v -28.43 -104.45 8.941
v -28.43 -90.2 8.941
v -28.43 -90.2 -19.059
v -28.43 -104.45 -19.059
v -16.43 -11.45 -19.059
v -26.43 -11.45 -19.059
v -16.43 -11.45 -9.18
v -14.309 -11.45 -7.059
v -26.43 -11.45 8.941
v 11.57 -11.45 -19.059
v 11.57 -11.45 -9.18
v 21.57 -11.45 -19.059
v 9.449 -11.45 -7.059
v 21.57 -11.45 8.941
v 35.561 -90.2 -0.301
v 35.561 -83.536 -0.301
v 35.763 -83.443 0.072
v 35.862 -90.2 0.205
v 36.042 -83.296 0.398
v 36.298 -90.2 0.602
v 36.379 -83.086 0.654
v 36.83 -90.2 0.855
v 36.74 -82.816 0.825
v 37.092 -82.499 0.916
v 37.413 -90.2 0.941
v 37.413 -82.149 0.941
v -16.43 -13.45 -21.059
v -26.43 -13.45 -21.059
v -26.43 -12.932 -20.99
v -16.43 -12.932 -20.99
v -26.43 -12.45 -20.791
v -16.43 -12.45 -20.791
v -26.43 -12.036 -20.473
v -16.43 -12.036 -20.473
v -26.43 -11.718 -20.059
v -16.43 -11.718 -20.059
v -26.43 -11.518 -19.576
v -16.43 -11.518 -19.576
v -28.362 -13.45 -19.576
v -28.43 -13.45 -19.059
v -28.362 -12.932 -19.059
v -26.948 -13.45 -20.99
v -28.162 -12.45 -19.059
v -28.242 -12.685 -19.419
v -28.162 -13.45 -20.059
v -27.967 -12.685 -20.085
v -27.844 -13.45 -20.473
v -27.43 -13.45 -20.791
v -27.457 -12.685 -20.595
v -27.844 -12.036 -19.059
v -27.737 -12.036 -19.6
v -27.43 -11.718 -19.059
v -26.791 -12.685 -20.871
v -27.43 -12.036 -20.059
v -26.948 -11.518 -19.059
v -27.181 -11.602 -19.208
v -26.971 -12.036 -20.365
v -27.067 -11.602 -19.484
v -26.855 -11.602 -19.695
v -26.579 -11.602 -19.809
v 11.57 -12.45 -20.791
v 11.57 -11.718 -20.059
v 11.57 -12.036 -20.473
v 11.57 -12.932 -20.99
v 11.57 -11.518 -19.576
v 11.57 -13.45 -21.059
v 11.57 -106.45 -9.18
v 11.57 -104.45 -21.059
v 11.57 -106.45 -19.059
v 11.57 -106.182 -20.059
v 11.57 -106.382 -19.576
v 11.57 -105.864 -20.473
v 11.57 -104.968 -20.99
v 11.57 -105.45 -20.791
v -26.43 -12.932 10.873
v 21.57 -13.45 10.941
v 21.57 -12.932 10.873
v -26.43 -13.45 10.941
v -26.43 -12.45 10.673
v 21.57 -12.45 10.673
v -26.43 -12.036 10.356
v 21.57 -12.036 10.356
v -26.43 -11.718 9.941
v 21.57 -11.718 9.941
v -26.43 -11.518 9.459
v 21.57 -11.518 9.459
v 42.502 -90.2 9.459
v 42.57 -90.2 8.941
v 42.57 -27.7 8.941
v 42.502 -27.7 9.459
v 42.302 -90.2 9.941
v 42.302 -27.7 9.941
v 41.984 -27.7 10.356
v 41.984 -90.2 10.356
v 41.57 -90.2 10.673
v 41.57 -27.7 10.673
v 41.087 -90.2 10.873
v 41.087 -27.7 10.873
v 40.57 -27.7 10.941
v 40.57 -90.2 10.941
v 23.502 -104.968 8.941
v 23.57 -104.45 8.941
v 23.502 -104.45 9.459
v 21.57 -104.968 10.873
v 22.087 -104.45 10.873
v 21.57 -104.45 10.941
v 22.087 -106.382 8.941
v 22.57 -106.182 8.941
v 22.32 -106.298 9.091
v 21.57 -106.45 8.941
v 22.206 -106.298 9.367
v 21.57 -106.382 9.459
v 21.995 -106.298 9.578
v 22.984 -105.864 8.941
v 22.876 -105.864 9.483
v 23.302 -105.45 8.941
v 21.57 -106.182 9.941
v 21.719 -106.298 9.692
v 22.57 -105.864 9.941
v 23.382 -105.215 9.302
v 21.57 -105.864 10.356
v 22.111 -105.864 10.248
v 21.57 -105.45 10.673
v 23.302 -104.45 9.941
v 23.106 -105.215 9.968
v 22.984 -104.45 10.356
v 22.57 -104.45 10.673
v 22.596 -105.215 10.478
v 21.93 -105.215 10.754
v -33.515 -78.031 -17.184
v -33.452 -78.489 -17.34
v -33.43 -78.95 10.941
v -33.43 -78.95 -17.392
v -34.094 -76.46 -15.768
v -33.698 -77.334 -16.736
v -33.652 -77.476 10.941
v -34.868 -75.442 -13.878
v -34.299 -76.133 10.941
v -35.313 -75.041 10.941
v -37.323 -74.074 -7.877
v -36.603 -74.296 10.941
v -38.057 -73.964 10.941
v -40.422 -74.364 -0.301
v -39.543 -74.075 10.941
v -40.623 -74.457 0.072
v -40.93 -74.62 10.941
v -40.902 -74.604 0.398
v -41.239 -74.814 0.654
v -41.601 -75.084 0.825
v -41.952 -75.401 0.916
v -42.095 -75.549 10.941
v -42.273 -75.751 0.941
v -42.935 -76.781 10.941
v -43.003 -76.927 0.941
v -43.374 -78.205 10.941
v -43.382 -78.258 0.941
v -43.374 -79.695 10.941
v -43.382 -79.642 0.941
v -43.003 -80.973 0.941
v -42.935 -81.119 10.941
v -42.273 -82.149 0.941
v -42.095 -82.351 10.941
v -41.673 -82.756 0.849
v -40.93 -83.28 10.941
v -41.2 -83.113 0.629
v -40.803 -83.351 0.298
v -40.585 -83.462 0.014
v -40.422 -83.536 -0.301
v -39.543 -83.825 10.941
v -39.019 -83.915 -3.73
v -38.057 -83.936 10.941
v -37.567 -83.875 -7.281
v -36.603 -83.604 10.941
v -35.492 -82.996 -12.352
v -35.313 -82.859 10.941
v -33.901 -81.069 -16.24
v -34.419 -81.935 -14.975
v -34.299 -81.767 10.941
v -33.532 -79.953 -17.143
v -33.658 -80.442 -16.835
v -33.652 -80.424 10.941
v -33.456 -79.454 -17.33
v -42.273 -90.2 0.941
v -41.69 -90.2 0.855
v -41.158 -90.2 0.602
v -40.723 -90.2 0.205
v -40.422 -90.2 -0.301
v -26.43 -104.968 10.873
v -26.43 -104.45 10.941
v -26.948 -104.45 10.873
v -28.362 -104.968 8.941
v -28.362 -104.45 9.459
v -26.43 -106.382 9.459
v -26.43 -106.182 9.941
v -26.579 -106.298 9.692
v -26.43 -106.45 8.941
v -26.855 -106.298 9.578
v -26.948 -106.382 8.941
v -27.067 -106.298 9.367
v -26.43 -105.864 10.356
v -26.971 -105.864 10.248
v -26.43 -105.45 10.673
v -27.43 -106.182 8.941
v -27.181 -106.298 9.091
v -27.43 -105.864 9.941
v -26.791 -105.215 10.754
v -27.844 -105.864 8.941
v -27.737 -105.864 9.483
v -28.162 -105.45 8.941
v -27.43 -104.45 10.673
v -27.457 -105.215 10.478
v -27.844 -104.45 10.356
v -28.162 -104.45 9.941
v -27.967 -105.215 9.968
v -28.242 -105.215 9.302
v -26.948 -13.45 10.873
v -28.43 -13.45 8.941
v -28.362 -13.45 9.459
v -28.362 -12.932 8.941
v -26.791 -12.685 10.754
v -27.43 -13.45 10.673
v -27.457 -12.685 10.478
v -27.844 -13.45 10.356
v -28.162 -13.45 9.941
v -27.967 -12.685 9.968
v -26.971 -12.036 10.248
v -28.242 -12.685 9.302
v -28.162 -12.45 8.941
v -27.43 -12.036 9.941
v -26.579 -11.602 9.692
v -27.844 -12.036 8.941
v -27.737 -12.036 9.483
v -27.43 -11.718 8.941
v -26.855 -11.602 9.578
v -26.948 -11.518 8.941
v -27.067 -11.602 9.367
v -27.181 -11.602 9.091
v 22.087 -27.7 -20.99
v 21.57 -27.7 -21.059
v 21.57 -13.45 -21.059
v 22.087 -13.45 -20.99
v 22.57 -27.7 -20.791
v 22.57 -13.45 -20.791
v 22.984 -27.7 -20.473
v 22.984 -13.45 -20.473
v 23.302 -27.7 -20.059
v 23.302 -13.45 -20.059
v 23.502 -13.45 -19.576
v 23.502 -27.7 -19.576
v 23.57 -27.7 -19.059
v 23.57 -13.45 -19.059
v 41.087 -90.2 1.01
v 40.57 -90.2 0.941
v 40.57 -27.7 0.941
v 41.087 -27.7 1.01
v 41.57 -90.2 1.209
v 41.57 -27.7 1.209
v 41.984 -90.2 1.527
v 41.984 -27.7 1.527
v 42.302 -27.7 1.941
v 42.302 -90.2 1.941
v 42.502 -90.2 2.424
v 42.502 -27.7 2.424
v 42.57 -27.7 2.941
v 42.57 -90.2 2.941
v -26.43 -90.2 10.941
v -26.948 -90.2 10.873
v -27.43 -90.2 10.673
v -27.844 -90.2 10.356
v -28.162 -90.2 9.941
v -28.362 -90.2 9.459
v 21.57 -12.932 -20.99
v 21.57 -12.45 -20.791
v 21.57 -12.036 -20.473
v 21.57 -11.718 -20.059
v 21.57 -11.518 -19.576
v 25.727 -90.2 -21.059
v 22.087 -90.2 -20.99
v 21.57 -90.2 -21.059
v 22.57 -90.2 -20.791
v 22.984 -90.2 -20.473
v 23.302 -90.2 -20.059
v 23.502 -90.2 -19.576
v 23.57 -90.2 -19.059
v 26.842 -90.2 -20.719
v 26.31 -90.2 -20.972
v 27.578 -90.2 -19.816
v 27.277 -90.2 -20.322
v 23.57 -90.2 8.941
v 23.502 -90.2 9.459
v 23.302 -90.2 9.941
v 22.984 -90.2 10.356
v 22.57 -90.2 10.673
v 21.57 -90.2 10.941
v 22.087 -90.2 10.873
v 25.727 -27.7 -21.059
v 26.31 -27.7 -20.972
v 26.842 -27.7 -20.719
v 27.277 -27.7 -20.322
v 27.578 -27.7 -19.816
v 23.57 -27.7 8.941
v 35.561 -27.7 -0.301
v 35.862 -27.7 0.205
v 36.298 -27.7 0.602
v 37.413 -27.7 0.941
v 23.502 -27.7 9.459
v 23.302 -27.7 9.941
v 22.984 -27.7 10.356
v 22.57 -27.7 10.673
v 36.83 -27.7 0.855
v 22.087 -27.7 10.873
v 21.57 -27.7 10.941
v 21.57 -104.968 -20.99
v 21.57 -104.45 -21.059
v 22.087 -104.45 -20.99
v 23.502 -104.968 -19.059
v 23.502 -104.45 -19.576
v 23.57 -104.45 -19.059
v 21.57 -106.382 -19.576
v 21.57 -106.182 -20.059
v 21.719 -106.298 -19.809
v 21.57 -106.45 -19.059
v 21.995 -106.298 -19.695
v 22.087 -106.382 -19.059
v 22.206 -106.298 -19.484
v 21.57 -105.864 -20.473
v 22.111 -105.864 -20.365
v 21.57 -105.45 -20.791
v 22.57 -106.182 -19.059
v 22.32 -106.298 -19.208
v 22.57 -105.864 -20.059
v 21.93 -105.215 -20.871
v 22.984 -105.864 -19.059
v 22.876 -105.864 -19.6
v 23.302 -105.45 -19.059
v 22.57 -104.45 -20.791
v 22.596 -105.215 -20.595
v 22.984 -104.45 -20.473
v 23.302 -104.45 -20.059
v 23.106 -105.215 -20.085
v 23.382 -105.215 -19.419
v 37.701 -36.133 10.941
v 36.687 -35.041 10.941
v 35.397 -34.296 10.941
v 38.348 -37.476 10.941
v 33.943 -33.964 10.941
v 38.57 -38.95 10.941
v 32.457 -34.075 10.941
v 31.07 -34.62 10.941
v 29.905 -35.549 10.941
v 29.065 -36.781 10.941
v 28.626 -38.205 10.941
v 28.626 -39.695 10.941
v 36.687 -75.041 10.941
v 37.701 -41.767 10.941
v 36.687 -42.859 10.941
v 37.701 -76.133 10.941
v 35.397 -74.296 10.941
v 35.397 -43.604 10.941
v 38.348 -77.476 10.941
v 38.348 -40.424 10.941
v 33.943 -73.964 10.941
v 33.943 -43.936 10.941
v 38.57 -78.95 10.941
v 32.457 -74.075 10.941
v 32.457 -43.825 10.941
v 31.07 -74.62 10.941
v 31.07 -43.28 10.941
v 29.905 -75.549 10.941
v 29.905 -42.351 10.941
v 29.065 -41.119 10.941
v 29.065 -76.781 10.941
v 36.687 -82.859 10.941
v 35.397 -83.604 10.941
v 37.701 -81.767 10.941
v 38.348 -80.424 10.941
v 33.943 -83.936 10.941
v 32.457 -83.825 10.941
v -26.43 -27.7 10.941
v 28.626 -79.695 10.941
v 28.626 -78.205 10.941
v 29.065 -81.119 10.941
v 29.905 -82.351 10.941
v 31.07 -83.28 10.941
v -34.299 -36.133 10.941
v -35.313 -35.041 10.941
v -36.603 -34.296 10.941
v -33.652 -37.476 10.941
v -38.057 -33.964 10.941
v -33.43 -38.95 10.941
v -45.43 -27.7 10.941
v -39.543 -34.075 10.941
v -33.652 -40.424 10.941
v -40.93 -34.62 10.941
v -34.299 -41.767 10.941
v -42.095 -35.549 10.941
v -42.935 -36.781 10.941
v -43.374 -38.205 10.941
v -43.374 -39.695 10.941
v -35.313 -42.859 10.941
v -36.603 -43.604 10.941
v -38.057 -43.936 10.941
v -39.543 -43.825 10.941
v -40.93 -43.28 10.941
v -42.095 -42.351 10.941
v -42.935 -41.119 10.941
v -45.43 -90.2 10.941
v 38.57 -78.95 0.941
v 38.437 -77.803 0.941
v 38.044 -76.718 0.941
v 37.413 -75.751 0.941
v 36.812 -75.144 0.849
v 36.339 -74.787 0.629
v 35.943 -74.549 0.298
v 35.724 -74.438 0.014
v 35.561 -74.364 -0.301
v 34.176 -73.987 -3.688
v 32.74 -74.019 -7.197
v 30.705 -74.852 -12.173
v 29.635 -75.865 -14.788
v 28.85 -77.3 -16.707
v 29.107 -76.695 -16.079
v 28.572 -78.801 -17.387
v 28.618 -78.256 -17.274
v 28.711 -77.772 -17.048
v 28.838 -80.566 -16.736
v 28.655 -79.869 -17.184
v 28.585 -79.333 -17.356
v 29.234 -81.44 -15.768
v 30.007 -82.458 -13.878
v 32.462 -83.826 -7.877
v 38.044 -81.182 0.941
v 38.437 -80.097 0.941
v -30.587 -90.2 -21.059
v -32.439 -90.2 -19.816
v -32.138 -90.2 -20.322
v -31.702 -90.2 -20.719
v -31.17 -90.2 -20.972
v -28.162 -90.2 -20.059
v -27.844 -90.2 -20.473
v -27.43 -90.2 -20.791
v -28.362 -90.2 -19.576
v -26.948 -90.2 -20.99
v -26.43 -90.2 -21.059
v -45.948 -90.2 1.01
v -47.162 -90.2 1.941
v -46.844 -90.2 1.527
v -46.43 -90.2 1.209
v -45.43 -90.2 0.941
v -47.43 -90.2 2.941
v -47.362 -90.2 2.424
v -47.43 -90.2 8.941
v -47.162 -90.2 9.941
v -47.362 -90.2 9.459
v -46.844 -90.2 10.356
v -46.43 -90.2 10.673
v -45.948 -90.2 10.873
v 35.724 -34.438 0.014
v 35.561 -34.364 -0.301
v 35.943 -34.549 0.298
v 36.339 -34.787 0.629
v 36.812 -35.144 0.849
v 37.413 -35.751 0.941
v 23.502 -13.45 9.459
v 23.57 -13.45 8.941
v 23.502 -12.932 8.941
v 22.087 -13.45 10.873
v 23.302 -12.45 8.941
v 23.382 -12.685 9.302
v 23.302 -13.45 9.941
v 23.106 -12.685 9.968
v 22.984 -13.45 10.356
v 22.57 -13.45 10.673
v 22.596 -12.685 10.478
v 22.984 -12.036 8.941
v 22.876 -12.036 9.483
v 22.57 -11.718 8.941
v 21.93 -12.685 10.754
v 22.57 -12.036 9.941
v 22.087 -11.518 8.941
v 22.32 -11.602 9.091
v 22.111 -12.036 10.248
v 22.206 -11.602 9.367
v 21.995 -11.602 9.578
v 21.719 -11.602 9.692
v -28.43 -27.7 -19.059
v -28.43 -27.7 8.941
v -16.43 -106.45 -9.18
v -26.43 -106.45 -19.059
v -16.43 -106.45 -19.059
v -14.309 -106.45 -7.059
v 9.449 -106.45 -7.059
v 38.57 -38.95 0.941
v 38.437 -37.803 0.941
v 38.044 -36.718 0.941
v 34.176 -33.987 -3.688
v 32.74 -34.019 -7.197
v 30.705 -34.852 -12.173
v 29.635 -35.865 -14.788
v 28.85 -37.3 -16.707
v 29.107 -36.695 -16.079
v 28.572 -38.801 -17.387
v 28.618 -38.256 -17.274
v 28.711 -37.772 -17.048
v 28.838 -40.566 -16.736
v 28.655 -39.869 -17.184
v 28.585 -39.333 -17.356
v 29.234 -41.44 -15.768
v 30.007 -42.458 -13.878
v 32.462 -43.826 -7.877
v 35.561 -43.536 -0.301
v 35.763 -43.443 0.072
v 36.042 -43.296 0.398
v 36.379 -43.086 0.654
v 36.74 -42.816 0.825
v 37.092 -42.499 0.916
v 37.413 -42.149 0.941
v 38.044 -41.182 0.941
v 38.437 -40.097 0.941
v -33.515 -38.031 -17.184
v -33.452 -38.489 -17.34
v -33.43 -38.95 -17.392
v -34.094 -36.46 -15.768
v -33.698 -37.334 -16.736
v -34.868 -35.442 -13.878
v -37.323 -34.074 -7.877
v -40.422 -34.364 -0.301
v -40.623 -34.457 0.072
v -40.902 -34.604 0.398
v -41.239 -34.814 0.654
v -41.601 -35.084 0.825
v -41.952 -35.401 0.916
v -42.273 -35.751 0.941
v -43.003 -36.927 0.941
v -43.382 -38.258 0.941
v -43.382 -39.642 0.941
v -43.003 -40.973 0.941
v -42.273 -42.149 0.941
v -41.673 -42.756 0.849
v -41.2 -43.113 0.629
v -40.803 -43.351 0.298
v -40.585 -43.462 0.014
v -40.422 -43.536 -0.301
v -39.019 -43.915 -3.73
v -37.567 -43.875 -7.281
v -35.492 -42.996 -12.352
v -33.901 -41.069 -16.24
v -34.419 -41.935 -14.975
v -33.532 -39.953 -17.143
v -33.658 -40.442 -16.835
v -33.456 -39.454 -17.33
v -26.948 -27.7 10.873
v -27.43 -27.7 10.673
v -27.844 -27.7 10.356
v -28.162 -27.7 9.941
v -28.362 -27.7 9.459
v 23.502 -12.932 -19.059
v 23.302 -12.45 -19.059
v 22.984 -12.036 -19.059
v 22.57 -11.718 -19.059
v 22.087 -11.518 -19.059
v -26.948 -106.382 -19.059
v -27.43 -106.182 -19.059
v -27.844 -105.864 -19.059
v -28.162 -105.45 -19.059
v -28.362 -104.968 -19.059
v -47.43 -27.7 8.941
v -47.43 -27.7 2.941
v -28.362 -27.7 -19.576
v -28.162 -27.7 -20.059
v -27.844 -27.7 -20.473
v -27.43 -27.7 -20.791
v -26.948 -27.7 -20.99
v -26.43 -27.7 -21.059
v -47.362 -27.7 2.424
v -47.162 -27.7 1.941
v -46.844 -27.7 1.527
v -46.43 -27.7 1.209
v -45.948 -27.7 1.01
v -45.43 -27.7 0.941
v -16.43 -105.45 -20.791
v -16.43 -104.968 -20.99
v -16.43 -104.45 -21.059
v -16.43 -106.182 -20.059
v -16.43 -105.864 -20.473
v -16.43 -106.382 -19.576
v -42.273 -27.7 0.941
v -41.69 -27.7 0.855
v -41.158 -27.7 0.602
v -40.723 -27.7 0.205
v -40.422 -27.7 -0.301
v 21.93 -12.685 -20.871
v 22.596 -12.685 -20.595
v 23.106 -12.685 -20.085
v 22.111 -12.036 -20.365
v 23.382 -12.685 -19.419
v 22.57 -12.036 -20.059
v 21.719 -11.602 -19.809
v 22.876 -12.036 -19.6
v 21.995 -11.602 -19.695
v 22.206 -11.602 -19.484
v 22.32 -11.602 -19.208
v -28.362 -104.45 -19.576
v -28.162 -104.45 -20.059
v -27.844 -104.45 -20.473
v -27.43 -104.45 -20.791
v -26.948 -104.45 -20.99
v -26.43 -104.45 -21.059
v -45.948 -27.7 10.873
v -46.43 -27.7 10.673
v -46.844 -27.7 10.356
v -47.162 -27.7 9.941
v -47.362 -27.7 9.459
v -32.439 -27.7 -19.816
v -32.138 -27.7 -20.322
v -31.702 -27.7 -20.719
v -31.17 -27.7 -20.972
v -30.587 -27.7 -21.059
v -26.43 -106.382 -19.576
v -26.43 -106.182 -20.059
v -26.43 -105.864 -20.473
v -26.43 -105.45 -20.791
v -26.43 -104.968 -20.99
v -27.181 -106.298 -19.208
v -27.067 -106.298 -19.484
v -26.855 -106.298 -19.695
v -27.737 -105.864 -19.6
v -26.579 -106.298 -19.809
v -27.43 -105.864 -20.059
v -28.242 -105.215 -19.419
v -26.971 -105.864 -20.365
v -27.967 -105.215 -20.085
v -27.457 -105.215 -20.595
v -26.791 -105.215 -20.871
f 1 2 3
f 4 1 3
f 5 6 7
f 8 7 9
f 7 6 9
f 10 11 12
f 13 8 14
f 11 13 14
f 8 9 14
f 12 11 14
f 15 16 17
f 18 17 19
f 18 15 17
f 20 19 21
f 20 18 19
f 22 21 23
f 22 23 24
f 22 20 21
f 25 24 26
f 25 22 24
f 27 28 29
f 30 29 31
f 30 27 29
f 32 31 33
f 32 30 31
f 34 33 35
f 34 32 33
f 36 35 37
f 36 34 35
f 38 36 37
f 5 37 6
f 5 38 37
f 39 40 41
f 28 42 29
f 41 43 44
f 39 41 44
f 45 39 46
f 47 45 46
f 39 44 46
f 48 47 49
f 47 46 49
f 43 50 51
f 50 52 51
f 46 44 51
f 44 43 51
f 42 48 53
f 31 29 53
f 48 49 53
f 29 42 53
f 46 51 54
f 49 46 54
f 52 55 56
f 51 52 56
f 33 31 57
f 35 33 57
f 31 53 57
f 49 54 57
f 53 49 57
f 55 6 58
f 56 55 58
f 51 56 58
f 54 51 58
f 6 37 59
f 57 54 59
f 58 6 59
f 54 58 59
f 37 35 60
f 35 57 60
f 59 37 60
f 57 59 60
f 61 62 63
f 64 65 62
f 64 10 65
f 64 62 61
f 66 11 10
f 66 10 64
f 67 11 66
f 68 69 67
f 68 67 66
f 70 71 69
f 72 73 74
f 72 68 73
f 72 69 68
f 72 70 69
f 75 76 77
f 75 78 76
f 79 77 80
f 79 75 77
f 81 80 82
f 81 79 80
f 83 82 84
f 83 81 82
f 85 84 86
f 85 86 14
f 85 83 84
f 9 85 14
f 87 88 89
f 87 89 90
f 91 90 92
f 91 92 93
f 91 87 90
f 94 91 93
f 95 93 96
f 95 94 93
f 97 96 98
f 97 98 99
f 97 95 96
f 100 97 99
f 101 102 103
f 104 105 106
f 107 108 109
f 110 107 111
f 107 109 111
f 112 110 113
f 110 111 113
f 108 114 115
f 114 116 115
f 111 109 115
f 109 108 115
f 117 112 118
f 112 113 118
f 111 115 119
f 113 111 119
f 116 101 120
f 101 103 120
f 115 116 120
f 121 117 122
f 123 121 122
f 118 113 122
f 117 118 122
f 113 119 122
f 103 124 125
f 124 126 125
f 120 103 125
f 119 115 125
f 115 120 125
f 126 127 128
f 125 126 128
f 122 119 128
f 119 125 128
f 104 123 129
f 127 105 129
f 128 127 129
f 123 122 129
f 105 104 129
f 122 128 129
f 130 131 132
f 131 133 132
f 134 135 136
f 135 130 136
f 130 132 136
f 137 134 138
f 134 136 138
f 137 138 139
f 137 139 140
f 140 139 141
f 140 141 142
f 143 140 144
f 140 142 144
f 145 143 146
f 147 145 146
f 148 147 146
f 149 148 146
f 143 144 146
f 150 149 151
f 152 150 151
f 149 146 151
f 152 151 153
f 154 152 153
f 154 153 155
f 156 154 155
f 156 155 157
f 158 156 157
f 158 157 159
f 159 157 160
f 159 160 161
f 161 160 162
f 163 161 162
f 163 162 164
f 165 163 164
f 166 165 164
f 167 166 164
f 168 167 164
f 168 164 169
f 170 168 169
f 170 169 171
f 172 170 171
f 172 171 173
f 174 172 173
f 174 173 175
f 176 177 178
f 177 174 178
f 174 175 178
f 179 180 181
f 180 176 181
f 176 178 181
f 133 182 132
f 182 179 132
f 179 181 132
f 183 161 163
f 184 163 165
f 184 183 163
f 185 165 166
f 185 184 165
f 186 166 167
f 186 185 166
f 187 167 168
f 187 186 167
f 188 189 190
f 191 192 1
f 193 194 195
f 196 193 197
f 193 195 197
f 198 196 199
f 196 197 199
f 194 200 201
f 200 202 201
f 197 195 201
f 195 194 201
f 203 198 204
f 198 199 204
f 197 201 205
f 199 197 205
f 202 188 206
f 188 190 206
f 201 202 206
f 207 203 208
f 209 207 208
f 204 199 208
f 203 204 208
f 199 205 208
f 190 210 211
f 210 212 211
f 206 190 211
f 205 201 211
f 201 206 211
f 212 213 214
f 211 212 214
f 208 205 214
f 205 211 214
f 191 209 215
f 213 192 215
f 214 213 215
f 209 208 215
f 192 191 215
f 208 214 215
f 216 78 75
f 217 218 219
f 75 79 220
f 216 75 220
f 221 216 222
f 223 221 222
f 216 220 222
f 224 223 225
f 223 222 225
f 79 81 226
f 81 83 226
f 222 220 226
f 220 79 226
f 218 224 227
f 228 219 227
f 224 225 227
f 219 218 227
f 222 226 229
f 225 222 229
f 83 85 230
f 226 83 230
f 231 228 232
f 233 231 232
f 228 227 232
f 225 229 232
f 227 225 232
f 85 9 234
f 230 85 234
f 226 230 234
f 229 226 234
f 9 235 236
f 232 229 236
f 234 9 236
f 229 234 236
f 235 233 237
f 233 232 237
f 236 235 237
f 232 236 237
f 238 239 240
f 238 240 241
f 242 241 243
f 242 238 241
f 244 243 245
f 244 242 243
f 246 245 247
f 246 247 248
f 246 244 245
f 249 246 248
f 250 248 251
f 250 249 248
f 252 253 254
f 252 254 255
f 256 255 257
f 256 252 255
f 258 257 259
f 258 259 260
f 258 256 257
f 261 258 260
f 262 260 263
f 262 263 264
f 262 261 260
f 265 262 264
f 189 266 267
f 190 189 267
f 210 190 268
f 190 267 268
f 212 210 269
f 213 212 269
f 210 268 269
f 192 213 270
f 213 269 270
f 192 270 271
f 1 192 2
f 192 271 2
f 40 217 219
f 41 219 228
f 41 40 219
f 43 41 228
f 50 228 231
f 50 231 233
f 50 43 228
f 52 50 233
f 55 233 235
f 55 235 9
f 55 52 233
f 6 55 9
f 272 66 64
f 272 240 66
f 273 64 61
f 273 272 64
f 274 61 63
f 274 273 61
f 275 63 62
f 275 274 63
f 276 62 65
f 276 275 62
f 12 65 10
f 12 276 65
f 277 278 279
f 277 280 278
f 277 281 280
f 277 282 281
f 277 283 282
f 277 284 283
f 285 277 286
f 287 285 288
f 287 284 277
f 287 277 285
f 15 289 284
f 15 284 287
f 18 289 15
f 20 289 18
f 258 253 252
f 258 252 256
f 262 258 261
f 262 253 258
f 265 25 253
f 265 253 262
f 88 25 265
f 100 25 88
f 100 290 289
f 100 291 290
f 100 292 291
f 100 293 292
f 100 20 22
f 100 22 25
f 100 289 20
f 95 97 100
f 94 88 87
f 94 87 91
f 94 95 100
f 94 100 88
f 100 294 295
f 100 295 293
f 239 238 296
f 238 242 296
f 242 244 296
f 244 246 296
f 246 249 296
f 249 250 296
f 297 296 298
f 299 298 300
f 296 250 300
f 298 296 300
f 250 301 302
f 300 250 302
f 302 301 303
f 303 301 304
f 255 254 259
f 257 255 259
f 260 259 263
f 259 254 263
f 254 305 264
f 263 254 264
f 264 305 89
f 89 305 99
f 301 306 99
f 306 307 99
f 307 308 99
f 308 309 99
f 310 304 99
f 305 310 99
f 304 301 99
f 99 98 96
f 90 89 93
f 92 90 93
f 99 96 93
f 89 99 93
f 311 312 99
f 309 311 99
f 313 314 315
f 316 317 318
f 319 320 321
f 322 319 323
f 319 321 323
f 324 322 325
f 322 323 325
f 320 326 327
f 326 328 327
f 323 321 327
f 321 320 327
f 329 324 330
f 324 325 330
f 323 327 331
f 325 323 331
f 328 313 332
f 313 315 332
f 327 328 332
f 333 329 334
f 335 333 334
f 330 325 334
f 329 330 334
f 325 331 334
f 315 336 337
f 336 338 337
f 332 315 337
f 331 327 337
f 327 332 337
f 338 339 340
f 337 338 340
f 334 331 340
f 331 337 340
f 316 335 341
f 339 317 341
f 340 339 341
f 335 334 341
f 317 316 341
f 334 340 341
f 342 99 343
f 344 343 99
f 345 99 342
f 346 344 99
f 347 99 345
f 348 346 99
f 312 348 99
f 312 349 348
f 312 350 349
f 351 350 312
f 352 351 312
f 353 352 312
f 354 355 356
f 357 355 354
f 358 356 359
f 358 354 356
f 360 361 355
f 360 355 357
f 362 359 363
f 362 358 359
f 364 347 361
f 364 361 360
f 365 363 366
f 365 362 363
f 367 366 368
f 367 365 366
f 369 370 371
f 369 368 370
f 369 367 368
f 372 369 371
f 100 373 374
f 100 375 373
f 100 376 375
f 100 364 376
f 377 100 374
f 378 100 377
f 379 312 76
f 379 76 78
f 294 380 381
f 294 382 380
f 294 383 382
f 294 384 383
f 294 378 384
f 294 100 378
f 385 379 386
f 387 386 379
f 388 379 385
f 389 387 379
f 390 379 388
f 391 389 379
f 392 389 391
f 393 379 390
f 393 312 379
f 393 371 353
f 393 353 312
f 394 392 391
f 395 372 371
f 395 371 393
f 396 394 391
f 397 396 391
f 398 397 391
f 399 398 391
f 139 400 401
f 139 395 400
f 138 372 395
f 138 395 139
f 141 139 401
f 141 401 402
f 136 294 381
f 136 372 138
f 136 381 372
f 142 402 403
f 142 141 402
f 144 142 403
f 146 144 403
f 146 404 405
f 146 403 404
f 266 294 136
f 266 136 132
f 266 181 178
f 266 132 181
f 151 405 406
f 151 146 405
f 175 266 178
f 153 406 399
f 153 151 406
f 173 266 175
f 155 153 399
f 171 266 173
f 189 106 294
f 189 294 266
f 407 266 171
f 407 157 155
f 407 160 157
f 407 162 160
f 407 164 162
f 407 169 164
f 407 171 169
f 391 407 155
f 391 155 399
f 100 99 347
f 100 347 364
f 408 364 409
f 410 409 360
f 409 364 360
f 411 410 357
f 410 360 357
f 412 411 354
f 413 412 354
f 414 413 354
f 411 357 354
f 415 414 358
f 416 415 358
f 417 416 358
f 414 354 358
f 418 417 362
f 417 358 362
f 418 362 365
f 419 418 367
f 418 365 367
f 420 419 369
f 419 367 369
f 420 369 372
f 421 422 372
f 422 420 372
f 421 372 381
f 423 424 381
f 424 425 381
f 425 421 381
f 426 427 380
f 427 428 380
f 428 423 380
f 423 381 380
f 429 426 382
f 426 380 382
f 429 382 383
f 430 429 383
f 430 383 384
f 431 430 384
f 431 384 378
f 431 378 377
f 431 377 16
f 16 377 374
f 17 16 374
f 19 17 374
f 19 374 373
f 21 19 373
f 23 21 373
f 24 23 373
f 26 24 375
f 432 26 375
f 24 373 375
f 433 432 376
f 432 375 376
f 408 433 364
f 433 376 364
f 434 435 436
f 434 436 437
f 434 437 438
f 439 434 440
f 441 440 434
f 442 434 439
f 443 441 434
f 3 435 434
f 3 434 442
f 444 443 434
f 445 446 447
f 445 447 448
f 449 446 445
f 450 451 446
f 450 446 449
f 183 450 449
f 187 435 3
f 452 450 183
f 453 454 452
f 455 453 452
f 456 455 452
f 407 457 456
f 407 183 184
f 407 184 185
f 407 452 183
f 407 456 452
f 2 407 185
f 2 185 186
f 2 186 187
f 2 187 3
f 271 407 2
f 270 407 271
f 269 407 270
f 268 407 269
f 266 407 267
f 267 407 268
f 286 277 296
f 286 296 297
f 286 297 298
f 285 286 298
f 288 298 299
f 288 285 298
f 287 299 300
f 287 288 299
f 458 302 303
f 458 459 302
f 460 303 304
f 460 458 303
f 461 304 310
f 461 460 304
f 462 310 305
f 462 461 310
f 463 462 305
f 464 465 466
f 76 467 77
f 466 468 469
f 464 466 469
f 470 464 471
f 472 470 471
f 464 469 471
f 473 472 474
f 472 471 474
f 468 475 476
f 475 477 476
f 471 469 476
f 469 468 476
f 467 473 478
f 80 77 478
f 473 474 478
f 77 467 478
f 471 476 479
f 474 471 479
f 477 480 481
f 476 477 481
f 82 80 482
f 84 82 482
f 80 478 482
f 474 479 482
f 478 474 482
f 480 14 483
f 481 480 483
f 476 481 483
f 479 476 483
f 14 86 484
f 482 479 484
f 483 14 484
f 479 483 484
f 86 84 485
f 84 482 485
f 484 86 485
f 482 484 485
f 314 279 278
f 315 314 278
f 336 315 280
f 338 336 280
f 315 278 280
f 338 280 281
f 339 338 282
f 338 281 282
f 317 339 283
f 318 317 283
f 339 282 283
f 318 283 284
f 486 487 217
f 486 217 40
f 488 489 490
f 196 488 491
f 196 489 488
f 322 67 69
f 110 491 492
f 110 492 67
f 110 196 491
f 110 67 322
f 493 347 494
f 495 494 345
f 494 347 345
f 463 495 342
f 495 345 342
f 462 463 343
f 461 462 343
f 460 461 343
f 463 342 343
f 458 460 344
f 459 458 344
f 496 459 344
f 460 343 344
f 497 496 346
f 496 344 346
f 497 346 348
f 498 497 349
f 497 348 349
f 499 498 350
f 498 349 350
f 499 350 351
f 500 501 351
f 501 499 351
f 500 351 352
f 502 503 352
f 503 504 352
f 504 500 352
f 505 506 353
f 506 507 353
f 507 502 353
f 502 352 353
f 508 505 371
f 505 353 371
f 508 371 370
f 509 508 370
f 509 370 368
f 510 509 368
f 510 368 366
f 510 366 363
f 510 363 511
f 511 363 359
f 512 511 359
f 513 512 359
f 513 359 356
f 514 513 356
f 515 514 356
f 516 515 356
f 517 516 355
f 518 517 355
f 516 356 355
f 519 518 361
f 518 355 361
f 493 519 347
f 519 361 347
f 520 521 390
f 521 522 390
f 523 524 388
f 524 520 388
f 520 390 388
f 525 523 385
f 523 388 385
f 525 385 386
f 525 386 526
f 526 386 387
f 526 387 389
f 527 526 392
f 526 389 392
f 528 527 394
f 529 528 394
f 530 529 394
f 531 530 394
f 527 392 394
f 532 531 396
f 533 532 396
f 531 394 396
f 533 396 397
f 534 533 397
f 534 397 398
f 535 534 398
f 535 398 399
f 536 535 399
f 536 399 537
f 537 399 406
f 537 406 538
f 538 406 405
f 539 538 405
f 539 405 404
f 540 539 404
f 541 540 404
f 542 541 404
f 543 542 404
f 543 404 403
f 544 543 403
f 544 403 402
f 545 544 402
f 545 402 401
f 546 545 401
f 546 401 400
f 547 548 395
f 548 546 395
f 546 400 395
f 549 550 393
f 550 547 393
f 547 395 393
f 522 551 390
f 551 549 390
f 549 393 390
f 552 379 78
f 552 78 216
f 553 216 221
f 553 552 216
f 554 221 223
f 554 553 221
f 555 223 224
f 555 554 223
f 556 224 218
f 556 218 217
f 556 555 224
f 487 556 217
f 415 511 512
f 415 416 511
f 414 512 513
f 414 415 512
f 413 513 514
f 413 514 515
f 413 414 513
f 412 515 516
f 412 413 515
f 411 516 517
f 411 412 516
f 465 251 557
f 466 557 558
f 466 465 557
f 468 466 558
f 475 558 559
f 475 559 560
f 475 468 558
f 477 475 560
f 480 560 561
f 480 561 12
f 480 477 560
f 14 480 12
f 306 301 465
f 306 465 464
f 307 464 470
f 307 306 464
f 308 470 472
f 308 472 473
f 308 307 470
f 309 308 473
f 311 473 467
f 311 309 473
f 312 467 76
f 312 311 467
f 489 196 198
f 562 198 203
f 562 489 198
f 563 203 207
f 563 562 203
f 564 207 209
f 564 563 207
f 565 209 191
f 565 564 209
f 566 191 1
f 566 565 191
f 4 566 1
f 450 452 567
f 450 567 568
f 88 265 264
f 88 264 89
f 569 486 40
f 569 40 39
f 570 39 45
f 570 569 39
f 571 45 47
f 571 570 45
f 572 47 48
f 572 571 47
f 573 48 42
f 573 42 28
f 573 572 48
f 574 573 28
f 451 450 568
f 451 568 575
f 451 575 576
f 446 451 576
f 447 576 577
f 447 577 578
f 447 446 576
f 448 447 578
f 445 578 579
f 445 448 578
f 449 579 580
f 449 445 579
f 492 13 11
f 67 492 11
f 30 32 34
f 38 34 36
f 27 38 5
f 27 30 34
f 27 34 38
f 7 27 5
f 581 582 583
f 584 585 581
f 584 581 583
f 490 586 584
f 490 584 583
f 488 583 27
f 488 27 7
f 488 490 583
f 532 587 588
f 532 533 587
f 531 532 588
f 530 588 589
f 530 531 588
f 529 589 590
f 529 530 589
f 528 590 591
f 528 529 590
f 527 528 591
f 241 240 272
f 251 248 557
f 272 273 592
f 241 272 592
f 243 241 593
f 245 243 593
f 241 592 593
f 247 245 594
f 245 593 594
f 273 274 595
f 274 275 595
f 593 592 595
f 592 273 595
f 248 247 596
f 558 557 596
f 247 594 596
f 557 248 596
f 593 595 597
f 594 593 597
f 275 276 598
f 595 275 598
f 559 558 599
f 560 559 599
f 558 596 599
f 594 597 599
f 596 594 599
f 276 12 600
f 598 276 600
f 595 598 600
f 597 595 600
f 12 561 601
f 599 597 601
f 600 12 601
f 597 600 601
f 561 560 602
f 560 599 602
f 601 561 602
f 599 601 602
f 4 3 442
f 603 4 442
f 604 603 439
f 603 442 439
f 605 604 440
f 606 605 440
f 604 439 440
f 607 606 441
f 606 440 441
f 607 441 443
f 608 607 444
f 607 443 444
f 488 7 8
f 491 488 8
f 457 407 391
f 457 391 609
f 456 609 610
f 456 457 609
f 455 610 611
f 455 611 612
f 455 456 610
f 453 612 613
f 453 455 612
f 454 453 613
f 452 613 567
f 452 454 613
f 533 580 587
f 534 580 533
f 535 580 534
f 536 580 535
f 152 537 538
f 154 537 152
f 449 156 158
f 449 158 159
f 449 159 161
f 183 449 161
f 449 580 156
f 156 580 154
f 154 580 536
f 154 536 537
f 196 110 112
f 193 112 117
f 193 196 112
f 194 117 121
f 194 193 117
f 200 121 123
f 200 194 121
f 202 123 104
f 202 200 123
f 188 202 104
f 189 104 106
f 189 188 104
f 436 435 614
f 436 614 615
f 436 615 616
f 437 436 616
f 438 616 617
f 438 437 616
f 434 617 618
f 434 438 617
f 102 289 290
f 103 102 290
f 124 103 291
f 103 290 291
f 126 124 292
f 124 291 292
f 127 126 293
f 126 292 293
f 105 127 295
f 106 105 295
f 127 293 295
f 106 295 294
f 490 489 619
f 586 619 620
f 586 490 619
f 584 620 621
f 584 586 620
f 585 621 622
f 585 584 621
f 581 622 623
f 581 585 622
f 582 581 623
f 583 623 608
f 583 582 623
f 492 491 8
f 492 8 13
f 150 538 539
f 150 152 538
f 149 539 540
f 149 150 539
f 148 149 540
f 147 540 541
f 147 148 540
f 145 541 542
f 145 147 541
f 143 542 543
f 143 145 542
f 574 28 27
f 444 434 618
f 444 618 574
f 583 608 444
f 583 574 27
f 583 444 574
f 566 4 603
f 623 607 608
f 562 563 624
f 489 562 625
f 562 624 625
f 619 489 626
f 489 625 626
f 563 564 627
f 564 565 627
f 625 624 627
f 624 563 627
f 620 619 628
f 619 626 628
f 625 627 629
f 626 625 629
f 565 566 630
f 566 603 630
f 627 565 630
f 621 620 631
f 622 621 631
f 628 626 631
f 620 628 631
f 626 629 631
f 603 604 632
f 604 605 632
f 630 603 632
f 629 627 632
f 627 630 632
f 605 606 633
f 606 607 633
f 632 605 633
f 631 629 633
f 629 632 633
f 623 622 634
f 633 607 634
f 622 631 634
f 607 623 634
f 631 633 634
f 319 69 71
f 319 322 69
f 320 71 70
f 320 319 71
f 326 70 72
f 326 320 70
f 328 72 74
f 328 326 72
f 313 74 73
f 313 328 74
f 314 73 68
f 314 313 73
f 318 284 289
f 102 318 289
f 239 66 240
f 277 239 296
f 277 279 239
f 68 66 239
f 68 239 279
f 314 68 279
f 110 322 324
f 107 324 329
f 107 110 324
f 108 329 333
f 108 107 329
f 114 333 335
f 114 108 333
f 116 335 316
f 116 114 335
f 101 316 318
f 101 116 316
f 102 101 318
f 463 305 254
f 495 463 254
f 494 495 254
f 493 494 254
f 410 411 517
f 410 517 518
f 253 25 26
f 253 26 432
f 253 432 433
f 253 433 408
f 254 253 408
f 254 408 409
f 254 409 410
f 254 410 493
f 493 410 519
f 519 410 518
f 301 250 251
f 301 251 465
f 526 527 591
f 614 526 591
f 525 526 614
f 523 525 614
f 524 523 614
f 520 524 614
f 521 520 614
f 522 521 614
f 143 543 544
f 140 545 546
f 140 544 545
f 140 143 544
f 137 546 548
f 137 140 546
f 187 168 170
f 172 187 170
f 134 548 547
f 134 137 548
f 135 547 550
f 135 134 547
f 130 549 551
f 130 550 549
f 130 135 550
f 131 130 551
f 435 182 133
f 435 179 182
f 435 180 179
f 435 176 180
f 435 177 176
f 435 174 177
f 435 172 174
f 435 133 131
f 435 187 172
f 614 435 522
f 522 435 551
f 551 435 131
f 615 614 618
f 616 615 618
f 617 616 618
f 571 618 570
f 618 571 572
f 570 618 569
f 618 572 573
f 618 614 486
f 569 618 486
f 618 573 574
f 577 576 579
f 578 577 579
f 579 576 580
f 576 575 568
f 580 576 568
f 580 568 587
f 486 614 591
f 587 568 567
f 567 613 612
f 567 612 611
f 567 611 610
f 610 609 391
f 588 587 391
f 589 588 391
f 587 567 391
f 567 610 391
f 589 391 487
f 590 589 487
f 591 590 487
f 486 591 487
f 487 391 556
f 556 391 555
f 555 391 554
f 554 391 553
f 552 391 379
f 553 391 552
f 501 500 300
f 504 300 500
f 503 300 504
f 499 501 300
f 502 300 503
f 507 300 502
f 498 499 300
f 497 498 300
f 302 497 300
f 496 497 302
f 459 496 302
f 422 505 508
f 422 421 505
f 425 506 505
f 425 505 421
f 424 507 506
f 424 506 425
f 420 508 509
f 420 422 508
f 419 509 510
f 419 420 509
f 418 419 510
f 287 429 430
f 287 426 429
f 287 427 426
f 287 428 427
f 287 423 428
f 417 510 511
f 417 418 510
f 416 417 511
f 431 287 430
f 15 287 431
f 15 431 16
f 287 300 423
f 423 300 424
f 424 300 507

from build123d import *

# Parameters (mm, degrees)
F0_W          = 90
F0_H          = 32
F1_DEPTH      = 65.2
F3_DEPTH      = 25
F4_W          = 90
F4_H          = 65.2
F5_DEPTH      = 32.001
F6_DEPTH      = 62.5
F8_DEPTH      = 16.25
F8_DEPTH_BACK = 78.75
F9_R          = 2
F11_DEPTH     = 78.751
F12_R         = 5
F13_DEPTH     = 32.001


with BuildPart() as f1:
    # F0 (on Front) → F1 (new body)
    with BuildSketch(Plane.XZ):
        with Locations((-2.4301670492, -5.0586230417)):
            Rectangle(F0_W, F0_H)
    extrude(amount=F1_DEPTH)

    # F2 (on face) → F3 (join)
    with BuildSketch(Plane.XZ.offset(65.2)):
        with BuildLine():
            Line((40.5698329508, 10.9413769583), (-45.4301670492, 10.9413769583))
            ThreePointArc((-45.4301670492, 10.9413769583), (-46.8443806115, 10.3555905207), (-47.4301670492, 8.9413769583))
            Line((-47.4301670492, 8.9413769583), (-47.4301670492, 2.9413769583))
            ThreePointArc((-47.4301670492, 2.9413769583), (-46.8443806115, 1.5271633959), (-45.4301670492, 0.9413769583))
            Line((-45.4301670492, 0.9413769583), (-42.2728696535, 0.9413769583))
            ThreePointArc((-42.2728696535, 0.9413769583), (-41.1580897163, 0.6018785968), (-40.4217757411, -0.3013573503))
            Line((-40.4217757411, -0.3013573503), (-32.4385583572, -19.8158887331))
            ThreePointArc((-32.4385583572, -19.8158887331), (-31.7022443821, -20.7191246802), (-30.5874644448, -21.0586230417))
            Line((-30.5874644448, -21.0586230417), (25.7271303465, -21.0586230417))
            ThreePointArc((25.7271303465, -21.0586230417), (26.8419102837, -20.7191246802), (27.5782242589, -19.8158887331))
            Line((27.5782242589, -19.8158887331), (35.5614416428, -0.3013573503))
            ThreePointArc((35.5614416428, -0.3013573503), (36.2977556179, 0.6018785968), (37.4125355552, 0.9413769583))
            Line((37.4125355552, 0.9413769583), (40.5698329508, 0.9413769583))
            ThreePointArc((40.5698329508, 0.9413769583), (41.9840465132, 1.5271633959), (42.5698329508, 2.9413769583))
            Line((42.5698329508, 2.9413769583), (42.5698329508, 8.9413769583))
            ThreePointArc((42.5698329508, 8.9413769583), (41.9840465132, 10.3555905207), (40.5698329508, 10.9413769583))
        make_face()
    extrude(amount=F3_DEPTH)

    # F4 (on face) → F5 (cut, through all)
    with BuildSketch(Plane.XY.offset(10.9413769583)):
        with Locations((-2.4301670492, -32.6)):
            Rectangle(F4_W, F4_H)
    extrude(amount=-F5_DEPTH, mode=Mode.SUBTRACT)

    # F6 (add): a face of the model
    f6_faces = [f1.faces().sort_by_distance(p)[0] for p in [
        (-2.4301670492, -90.2, -3.7537517767),
    ]]
    extrude(f6_faces, amount=-F6_DEPTH)

    # F7 (on face) → F8 (join, two sides)
    with BuildSketch(Plane.XZ.offset(90.2)) as f8_sk:
        with BuildLine():
            Line((21.5698329508, 10.9413769583), (-26.4301670492, 10.9413769583))
            ThreePointArc((-26.4301670492, 10.9413769583), (-27.8443806115, 10.3555905207), (-28.4301670492, 8.9413769583))
            Line((-28.4301670492, 8.9413769583), (-28.4301670492, -19.0586230417))
            ThreePointArc((-28.4301670492, -19.0586230417), (-27.8443806115, -20.4728366041), (-26.4301670492, -21.0586230417))
            Line((-26.4301670492, -21.0586230417), (-16.4301670492, -21.0586230417))
            Line((-16.4301670492, -21.0586230417), (-16.4301670492, -9.1799433853))
            Line((-16.4301670492, -9.1799433853), (-14.3088467056, -7.0586230417))
            Line((-14.3088467056, -7.0586230417), (9.4485126073, -7.0586230417))
            Line((9.4485126073, -7.0586230417), (11.5698329508, -9.1799433853))
            Line((11.5698329508, -9.1799433853), (11.5698329508, -21.0586230417))
            Line((11.5698329508, -21.0586230417), (21.5698329508, -21.0586230417))
            ThreePointArc((21.5698329508, -21.0586230417), (22.9840465132, -20.4728366041), (23.5698329508, -19.0586230417))
            Line((23.5698329508, -19.0586230417), (23.5698329508, 8.9413769583))
            ThreePointArc((23.5698329508, 8.9413769583), (22.9840465132, 10.3555905207), (21.5698329508, 10.9413769583))
        make_face()
    extrude(amount=F8_DEPTH)
    extrude(f8_sk.sketch, amount=-F8_DEPTH_BACK)

    # F9
    f9_edges = [f1.edges().sort_by_distance(p)[0] for p in [
        (-28.430167, -106.45, -5.058623),
        (-2.430167, -11.45, 10.941377),
    ]]
    fillet(f9_edges, radius=F9_R)

    # F10 (on face) → F11 (cut, through all)
    with BuildSketch(Plane.XZ.offset(90.2)):
        Polygon((-16.4301670492, -9.1799433853), (-16.4301670492, -21.0586230417), (11.5698329508, -21.0586230417), (11.5698329508, -9.1799433853), (9.4485126073, -7.0586230417), (-14.3088467056, -7.0586230417), align=None)
    extrude(amount=-F11_DEPTH, mode=Mode.SUBTRACT)

    # F12 (on face) → F13 (cut, through all)
    with BuildSketch(Plane.XY.offset(10.9413769583)):
        with Locations((-38.4301670492, -38.95)):
            Circle(F12_R)
        with Locations((-38.4301670492, -78.95)):
            Circle(F12_R)
        with Locations((33.5698329508, -78.95)):
            Circle(F12_R)
        with Locations((33.5698329508, -38.95)):
            Circle(F12_R)
    extrude(amount=-F13_DEPTH, mode=Mode.SUBTRACT)


solid = f1.part
